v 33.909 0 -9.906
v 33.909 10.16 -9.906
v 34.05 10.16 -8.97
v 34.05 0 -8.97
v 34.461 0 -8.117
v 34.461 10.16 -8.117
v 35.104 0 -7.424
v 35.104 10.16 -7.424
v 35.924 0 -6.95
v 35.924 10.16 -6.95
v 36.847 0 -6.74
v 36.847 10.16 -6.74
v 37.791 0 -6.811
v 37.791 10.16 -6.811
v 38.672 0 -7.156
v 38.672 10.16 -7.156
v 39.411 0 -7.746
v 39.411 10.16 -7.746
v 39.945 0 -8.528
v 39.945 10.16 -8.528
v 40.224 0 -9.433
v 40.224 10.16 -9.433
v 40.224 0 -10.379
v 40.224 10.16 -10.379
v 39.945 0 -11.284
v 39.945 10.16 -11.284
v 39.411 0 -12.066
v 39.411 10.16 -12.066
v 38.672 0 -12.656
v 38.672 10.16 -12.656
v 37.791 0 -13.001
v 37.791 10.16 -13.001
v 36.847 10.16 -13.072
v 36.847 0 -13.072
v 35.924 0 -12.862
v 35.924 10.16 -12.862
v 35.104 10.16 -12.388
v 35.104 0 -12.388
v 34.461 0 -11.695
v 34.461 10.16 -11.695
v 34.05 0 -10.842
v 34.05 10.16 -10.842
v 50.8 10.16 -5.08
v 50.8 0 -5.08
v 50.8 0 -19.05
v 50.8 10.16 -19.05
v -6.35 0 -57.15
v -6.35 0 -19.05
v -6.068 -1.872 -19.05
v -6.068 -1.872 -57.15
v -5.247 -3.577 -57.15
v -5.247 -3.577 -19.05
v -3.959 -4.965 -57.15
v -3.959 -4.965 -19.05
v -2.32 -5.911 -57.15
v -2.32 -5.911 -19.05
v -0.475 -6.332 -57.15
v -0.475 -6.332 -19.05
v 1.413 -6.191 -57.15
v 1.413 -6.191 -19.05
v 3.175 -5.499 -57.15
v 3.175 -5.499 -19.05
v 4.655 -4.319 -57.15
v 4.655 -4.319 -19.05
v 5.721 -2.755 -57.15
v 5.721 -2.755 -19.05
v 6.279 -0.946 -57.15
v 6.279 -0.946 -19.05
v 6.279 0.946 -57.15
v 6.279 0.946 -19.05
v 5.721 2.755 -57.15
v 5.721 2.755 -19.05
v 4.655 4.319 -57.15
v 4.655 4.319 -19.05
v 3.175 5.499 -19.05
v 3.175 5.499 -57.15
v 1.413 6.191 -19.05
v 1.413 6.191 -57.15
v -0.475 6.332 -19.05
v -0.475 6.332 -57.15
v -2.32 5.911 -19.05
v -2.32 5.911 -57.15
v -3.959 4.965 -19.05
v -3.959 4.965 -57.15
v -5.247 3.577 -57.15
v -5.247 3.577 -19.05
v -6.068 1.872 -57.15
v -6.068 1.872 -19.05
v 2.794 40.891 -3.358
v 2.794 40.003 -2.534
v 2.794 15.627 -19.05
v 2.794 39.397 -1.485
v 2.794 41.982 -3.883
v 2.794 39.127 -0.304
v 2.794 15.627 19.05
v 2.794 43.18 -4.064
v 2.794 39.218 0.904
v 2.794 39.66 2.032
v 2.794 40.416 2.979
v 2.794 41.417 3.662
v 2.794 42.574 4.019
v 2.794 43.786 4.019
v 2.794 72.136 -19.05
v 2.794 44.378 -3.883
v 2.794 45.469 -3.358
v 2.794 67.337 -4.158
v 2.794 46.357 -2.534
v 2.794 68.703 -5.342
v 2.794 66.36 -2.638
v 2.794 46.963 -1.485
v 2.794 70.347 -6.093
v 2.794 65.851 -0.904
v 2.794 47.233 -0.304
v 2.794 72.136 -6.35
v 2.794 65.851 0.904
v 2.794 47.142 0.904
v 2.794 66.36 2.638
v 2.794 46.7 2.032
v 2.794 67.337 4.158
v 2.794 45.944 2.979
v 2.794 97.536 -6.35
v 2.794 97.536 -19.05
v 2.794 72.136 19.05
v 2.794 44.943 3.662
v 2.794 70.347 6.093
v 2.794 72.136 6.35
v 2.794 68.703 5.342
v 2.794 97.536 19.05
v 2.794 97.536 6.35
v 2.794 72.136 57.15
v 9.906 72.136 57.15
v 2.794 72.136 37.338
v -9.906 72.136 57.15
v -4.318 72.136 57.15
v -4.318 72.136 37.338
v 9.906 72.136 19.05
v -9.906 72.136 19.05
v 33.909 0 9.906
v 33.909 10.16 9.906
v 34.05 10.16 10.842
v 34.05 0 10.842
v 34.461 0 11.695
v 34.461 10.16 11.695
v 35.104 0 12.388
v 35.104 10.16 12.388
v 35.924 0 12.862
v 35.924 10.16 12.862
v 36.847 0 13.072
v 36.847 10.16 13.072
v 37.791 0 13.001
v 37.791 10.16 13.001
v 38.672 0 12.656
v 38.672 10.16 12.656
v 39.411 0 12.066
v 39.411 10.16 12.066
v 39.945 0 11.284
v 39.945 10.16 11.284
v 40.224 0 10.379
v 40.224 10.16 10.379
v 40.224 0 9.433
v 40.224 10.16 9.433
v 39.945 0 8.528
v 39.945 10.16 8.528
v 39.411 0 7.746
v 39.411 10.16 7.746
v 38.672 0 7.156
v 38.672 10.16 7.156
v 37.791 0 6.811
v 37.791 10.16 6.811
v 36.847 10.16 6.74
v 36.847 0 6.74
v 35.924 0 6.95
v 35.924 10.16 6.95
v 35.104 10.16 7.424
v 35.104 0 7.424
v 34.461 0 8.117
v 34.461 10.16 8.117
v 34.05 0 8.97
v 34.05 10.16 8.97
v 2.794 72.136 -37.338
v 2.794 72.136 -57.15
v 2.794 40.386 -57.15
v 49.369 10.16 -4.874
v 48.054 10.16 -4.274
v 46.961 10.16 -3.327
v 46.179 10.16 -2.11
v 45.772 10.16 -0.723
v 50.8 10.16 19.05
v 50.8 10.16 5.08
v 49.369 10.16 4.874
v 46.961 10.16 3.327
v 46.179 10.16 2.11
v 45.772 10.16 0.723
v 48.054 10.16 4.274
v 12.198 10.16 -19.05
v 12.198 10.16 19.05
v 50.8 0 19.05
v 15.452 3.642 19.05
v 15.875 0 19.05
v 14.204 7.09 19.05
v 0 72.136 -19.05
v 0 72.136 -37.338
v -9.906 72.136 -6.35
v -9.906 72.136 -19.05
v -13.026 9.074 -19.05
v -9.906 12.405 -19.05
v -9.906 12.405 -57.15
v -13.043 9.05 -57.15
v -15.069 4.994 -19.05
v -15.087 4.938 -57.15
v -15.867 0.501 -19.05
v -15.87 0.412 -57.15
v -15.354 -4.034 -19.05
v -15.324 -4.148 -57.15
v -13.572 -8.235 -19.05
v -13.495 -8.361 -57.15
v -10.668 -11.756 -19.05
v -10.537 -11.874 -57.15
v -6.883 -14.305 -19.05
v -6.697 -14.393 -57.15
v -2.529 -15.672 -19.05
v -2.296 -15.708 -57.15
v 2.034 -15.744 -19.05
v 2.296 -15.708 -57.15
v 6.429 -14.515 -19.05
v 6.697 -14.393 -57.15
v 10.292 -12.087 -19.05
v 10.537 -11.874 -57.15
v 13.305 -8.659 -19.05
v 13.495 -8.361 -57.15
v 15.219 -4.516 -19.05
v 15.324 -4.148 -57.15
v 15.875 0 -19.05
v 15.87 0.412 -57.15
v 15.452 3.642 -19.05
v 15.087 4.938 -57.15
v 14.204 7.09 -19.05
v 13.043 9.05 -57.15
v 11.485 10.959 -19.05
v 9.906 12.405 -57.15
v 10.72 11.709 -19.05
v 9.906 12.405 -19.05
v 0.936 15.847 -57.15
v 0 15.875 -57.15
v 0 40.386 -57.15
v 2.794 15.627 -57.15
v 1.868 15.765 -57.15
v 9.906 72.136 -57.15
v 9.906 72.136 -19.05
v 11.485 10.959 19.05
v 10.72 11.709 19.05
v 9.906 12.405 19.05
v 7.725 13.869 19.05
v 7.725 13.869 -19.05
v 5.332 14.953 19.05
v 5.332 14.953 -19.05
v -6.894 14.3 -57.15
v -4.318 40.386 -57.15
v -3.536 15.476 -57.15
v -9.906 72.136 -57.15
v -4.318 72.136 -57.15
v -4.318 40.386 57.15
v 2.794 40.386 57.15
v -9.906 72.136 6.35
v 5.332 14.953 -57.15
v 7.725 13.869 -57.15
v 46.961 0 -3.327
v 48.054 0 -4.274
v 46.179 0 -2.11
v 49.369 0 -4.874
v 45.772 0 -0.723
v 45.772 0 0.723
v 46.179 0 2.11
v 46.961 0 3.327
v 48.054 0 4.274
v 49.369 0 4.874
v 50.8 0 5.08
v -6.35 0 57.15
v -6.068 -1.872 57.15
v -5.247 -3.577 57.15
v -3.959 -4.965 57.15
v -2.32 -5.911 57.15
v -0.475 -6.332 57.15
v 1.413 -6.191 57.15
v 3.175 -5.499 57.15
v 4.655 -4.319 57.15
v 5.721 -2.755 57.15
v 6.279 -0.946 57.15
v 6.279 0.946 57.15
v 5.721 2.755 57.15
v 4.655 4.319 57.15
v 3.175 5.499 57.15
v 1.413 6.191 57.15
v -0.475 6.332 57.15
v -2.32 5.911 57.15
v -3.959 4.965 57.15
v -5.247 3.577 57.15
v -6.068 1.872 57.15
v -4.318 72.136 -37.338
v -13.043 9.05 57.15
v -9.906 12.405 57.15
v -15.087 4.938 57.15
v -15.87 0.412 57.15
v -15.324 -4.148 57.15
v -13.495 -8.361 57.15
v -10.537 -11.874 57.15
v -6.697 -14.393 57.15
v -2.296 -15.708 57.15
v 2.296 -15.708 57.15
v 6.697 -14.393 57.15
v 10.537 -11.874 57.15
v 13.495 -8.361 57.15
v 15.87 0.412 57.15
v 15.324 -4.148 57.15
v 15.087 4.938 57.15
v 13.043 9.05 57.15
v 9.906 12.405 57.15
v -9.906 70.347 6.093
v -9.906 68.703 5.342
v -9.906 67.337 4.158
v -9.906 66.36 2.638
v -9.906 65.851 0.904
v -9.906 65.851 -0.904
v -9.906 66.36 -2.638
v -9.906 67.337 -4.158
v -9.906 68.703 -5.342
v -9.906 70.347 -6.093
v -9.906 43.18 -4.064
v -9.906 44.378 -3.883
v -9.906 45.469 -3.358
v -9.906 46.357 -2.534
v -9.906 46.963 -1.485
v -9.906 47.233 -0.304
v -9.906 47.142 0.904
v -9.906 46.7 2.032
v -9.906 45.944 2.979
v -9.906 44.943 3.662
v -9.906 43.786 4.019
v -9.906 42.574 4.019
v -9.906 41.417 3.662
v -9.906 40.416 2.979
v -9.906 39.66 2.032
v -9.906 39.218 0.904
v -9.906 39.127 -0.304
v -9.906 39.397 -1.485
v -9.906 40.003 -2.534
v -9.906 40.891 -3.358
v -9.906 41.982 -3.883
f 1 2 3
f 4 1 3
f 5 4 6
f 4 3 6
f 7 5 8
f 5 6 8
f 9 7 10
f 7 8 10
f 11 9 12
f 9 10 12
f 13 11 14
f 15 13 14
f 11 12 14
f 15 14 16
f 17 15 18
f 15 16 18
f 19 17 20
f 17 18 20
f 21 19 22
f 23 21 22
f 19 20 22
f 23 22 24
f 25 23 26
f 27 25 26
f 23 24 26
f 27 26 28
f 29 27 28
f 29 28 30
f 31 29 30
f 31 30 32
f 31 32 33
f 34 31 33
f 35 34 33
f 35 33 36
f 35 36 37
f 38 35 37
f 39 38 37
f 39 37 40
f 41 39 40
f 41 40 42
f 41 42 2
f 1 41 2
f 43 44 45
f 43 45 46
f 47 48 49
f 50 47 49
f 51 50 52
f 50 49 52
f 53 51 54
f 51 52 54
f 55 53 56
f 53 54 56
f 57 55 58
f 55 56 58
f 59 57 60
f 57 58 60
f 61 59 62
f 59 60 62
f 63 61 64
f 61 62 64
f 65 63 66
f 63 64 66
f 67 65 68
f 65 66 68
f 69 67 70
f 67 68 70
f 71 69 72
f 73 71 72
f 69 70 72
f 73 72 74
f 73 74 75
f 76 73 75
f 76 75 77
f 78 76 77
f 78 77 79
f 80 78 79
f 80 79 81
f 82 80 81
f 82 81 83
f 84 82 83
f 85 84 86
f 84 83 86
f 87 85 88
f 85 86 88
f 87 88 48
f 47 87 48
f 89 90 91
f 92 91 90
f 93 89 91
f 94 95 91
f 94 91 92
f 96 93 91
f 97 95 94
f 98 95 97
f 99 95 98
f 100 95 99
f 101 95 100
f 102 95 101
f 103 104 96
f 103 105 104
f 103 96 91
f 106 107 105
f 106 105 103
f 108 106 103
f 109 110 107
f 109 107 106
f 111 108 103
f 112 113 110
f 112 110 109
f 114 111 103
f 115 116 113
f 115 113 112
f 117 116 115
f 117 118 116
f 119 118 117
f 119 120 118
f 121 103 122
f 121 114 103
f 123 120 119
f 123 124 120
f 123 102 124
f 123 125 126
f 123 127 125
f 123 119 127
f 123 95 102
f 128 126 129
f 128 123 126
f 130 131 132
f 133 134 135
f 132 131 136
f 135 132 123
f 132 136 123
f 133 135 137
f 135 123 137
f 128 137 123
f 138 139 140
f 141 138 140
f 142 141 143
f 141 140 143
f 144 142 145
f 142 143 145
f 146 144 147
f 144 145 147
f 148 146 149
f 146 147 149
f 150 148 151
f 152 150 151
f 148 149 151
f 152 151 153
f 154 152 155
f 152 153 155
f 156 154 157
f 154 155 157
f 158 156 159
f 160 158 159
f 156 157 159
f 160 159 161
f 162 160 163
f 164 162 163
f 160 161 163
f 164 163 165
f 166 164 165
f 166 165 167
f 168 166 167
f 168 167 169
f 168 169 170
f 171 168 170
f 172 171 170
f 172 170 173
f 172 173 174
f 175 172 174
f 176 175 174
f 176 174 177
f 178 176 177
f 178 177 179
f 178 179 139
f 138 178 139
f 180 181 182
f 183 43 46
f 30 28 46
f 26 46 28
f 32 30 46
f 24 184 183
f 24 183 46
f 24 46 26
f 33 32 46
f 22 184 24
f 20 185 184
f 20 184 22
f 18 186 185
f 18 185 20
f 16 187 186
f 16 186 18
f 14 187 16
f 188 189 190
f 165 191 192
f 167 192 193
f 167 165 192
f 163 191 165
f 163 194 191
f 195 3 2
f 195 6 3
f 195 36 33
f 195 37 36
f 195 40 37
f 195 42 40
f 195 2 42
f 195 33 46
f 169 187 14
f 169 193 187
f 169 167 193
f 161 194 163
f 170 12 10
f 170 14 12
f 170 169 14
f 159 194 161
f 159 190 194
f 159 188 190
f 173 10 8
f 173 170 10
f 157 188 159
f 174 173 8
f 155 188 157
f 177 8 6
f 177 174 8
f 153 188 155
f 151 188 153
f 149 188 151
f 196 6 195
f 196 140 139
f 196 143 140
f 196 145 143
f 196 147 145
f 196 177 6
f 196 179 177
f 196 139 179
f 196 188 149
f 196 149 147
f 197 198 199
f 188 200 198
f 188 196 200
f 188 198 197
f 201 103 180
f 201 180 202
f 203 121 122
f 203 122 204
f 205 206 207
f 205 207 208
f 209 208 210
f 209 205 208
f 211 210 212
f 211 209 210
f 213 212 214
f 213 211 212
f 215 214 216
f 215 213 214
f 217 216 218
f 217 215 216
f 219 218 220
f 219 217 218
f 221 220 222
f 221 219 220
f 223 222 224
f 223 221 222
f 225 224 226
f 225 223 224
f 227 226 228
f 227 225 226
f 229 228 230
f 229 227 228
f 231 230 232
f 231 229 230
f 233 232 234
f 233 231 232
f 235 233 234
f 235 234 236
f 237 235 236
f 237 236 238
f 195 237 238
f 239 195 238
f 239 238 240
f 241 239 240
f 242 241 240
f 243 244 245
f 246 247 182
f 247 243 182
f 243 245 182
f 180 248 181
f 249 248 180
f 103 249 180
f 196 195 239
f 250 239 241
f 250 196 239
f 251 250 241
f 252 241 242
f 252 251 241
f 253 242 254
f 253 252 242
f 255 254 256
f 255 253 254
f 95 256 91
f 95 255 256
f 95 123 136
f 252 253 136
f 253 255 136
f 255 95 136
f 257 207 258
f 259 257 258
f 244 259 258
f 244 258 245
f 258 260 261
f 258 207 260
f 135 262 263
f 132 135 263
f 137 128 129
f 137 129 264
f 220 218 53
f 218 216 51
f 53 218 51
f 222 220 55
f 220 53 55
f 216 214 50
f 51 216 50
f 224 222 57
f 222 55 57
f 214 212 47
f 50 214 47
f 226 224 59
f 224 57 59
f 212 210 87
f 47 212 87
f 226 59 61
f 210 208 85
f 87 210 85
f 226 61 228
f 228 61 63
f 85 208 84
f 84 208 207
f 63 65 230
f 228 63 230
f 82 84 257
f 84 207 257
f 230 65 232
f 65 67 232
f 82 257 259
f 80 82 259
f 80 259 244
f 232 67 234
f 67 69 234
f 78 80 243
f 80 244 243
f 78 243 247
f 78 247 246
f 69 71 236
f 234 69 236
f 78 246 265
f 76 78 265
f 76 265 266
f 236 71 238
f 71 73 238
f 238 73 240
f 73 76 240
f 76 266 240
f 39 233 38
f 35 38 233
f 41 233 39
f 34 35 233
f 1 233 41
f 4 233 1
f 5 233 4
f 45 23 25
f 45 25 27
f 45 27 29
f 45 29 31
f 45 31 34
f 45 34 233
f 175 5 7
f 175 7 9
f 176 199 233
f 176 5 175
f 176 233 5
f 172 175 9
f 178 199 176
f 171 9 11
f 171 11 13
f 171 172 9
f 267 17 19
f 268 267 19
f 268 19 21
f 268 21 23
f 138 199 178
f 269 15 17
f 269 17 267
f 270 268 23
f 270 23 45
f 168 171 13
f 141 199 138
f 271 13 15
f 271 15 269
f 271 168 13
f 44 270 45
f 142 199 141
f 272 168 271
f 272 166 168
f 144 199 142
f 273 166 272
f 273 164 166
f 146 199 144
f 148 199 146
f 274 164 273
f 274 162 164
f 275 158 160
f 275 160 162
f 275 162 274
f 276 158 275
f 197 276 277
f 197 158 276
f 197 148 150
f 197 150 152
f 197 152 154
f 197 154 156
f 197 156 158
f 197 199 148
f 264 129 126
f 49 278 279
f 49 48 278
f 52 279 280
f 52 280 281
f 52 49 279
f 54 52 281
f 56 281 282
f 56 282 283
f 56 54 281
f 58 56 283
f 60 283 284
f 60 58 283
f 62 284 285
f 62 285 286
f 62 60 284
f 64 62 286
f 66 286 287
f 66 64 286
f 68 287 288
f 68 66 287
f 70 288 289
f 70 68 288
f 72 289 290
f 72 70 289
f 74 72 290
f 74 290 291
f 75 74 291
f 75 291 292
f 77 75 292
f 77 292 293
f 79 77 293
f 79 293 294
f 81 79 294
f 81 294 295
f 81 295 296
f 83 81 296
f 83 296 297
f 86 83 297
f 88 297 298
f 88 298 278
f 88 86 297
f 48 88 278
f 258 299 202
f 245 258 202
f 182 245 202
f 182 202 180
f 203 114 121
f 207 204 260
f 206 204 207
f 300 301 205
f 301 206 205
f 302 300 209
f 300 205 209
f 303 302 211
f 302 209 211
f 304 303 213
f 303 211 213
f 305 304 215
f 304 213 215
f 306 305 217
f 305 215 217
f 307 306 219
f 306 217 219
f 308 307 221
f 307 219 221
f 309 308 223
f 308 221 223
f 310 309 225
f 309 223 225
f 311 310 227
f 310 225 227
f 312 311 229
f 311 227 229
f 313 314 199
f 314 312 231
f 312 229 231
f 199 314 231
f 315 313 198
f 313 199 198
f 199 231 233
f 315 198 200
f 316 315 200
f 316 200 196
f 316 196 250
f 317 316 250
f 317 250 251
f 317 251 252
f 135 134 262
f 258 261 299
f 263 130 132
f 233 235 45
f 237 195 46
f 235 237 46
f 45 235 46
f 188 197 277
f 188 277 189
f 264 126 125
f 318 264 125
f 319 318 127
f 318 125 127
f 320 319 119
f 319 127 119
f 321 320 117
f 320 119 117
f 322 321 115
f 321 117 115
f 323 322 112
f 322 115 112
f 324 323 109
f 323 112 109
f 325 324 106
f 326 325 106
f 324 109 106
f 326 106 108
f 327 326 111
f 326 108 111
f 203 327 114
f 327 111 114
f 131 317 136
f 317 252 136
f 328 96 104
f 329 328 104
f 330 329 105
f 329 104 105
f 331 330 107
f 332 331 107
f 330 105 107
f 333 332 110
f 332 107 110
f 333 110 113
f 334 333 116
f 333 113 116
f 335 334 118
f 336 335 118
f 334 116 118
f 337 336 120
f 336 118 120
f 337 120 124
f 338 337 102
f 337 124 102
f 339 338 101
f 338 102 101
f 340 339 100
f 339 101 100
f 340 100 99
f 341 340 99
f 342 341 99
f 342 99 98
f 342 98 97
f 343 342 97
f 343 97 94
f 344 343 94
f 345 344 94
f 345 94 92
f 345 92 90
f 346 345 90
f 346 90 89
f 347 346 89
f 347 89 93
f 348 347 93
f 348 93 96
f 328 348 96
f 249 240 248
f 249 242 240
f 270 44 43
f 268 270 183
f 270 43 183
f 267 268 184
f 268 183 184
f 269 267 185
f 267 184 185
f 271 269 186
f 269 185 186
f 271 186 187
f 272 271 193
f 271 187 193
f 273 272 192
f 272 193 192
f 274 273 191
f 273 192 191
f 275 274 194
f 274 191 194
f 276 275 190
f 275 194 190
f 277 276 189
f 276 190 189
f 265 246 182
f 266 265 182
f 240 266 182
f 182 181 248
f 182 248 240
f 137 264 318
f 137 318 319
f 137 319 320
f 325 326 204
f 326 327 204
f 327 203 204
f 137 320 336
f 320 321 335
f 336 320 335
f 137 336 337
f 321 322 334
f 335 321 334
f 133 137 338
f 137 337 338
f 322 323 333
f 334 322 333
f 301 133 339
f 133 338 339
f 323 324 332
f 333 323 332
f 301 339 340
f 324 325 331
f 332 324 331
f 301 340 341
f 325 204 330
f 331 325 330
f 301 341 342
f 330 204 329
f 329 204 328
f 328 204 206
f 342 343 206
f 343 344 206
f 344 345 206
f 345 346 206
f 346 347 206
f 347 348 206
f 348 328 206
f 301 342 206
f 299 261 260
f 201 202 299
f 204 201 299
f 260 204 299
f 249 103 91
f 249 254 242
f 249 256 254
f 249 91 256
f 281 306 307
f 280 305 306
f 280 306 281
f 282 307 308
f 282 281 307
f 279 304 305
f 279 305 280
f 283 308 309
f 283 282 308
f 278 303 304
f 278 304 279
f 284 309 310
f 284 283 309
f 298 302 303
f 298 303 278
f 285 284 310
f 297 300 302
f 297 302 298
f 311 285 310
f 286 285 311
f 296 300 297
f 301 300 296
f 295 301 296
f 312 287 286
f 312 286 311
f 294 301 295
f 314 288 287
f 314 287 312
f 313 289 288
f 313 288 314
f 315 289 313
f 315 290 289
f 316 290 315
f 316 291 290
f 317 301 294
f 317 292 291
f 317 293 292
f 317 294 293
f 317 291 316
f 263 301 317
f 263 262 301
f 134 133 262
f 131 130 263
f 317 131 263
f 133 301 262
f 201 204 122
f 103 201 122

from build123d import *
from build123d.topology import SkipClean

# Parameters (mm, degrees)
SKETCH1_R           = 15.875
SKETCH1_R_2         = 6.35
BOSS_EXTRUDE1_DEPTH = 19.05
BOSS_EXTRUDE2_START = 19.05
SKETCH1_3_R         = 15.875
SKETCH1_3_R_2       = 6.35
BOSS_EXTRUDE2_DEPTH = 38.1
BOSS_EXTRUDE3_START = -19.05
SKETCH1_4_R         = 15.875
SKETCH1_4_R_2       = 6.35
BOSS_EXTRUDE3_DEPTH = 38.1
SKETCH2_W           = 7.112
SKETCH2_H           = 19.812
CUT_EXTRUDE1_DEPTH  = 138.602767
SKETCH4_R           = 6.35
SKETCH4_R_2         = 4.064
CUT_EXTRUDE2_DEPTH  = 123.816814
SKETCH5_R           = 3.175
SKETCH5_R_2         = 5.08
CUT_EXTRUDE3_DEPTH  = 117.109121


with BuildPart() as part:
    # Sketch1 → Boss-Extrude1 (new, symmetric)
    with BuildSketch(Plane.XY):
        Polygon((2.794, 97.536), (-9.906, 72.136), (0, 72.136), (2.794, 72.136), align=None)
        with BuildLine():
            Line((-9.906, 72.136), (-9.906, 12.405111))
            ThreePointArc((-9.906, 12.405111), (-5.24807, 14.982436), (0, 15.875))
            Line((0, 15.875), (0, 72.136))
            Line((0, 72.136), (-9.906, 72.136))
        make_face()
        with BuildLine():
            Line((0, 72.136), (0, 15.875))
            ThreePointArc((0, 15.875), (1.402484, 15.812927), (2.794, 15.627194))
            Line((2.794, 15.627194), (2.794, 72.136))
            Line((2.794, 72.136), (0, 72.136))
        make_face()
        Circle(SKETCH1_R)
        with Locations(Location((0, 0, 0), (0, 0, 180))):
            Circle(SKETCH1_R_2, mode=Mode.SUBTRACT)
        with BuildLine():
            ThreePointArc((12.197952, 10.16), (14.92746, 5.40246), (15.875, 0))
            Line((15.875, 0), (50.8, 0))
            Line((50.8, 0), (50.8, 10.16))
            Line((50.8, 10.16), (12.197952, 10.16))
        make_face()
    extrude(amount=BOSS_EXTRUDE1_DEPTH, both=True)

    # Sketch1<3> → Boss-Extrude2 (add)
    with BuildSketch(Plane.XY.offset(BOSS_EXTRUDE2_START)):
        with BuildLine():
            Line((-9.906, 72.136), (-9.906, 12.405111))
            ThreePointArc((-9.906, 12.405111), (-5.24807, 14.982436), (0, 15.875))
            Line((0, 15.875), (0, 72.136))
            Line((0, 72.136), (-9.906, 72.136))
        make_face()
        Circle(SKETCH1_3_R)
        with Locations(Location((0, 0, 0), (0, 0, 180))):
            Circle(SKETCH1_3_R_2, mode=Mode.SUBTRACT)
        with BuildLine():
            ThreePointArc((2.794, 15.627194), (6.55118, 14.46021), (9.906, 12.405111))
            Line((9.906, 12.405111), (9.906, 72.136))
            Line((9.906, 72.136), (2.794, 72.136))
            Line((2.794, 72.136), (2.794, 15.627194))
        make_face()
        with BuildLine():
            Line((0, 72.136), (0, 15.875))
            ThreePointArc((0, 15.875), (1.402484, 15.812927), (2.794, 15.627194))
            Line((2.794, 15.627194), (2.794, 72.136))
            Line((2.794, 72.136), (0, 72.136))
        make_face()
    extrude(amount=BOSS_EXTRUDE2_DEPTH)

    # Sketch1<4> → Boss-Extrude3 (add)
    with SkipClean():  # the faces are left unmerged after this step: merging them gives an invalid solid
        with BuildSketch(Plane.XY.offset(BOSS_EXTRUDE3_START)):
            with BuildLine():
                ThreePointArc((2.794, 15.627194), (6.55118, 14.46021), (9.906, 12.405111))
                Line((9.906, 12.405111), (9.906, 72.136))
                Line((9.906, 72.136), (2.794, 72.136))
                Line((2.794, 72.136), (2.794, 15.627194))
            make_face()
            with BuildLine():
                Line((-9.906, 72.136), (-9.906, 12.405111))
                ThreePointArc((-9.906, 12.405111), (-5.24807, 14.982436), (0, 15.875))
                Line((0, 15.875), (0, 72.136))
                Line((0, 72.136), (-9.906, 72.136))
            make_face()
            Circle(SKETCH1_4_R)
            with Locations(Location((0, 0, 0), (0, 0, 180))):
                Circle(SKETCH1_4_R_2, mode=Mode.SUBTRACT)
            with BuildLine():
                Line((0, 72.136), (0, 15.875))
                ThreePointArc((0, 15.875), (1.402484, 15.812927), (2.794, 15.627194))
                Line((2.794, 15.627194), (2.794, 72.136))
                Line((2.794, 72.136), (0, 72.136))
            make_face()
        extrude(amount=-BOSS_EXTRUDE3_DEPTH)

    # Sketch2 → Cut-Extrude1 (cut, through all, along a direction that is not the sketch's normal)
    with SkipClean():  # the faces are left unmerged after this step: merging them gives an invalid solid
        with BuildSketch(Plane(origin=(0, 72.136, 0), x_dir=(1, 0, 0), z_dir=(0, 1, 0))):
            with Locations((-0.762, -47.244)):
                Rectangle(SKETCH2_W, SKETCH2_H)
        cut_extrude1 = extrude(amount=-CUT_EXTRUDE1_DEPTH, dir=(0, 0.8483793786580408, -0.5293887322826173), mode=Mode.SUBTRACT)

    # Mirror1: Cut-Extrude1 across plane
    with SkipClean():  # the faces are left unmerged after this step: merging them gives an invalid solid
        add(cut_extrude1.mirror(Plane.XY), mode=Mode.SUBTRACT)

    # Sketch4 → Cut-Extrude2 (cut, through all)
    with SkipClean():  # the faces are left unmerged after this step: merging them gives an invalid solid
        with BuildSketch(Plane(origin=(2.794, 0, 0), x_dir=(0, 0, -1), z_dir=(1, 0, 0))):
            with BuildLine():
                Line((-6.35, 97.536), (-6.35, 72.136))
                ThreePointArc((-6.35, 72.136), (0, 78.486), (6.35, 72.136))
                Line((6.35, 72.136), (6.35, 97.536))
                Line((6.35, 97.536), (-6.35, 97.536))
            make_face()
            with Locations((0, 72.136)):
                Circle(SKETCH4_R)
            with Locations((0, 43.18)):
                Circle(SKETCH4_R_2)
        extrude(amount=-CUT_EXTRUDE2_DEPTH, mode=Mode.SUBTRACT)

    # Sketch5 → Cut-Extrude3 (cut, through all)
    with SkipClean():  # the faces are left unmerged after this step: merging them gives an invalid solid
        with BuildSketch(Plane(origin=(0, 10.16, 0), x_dir=(1, 0, 0), z_dir=(0, 1, 0))):
            with Locations(Location((37.084, -9.906, 0), (0, 0, 180))):
                Circle(SKETCH5_R)
            with Locations(Location((37.084, 9.906, 0), (0, 0, 180))):
                Circle(SKETCH5_R)
            with Locations((50.8, 0)):
                Circle(SKETCH5_R_2)
        extrude(amount=-CUT_EXTRUDE3_DEPTH, mode=Mode.SUBTRACT)


solid = part.part
